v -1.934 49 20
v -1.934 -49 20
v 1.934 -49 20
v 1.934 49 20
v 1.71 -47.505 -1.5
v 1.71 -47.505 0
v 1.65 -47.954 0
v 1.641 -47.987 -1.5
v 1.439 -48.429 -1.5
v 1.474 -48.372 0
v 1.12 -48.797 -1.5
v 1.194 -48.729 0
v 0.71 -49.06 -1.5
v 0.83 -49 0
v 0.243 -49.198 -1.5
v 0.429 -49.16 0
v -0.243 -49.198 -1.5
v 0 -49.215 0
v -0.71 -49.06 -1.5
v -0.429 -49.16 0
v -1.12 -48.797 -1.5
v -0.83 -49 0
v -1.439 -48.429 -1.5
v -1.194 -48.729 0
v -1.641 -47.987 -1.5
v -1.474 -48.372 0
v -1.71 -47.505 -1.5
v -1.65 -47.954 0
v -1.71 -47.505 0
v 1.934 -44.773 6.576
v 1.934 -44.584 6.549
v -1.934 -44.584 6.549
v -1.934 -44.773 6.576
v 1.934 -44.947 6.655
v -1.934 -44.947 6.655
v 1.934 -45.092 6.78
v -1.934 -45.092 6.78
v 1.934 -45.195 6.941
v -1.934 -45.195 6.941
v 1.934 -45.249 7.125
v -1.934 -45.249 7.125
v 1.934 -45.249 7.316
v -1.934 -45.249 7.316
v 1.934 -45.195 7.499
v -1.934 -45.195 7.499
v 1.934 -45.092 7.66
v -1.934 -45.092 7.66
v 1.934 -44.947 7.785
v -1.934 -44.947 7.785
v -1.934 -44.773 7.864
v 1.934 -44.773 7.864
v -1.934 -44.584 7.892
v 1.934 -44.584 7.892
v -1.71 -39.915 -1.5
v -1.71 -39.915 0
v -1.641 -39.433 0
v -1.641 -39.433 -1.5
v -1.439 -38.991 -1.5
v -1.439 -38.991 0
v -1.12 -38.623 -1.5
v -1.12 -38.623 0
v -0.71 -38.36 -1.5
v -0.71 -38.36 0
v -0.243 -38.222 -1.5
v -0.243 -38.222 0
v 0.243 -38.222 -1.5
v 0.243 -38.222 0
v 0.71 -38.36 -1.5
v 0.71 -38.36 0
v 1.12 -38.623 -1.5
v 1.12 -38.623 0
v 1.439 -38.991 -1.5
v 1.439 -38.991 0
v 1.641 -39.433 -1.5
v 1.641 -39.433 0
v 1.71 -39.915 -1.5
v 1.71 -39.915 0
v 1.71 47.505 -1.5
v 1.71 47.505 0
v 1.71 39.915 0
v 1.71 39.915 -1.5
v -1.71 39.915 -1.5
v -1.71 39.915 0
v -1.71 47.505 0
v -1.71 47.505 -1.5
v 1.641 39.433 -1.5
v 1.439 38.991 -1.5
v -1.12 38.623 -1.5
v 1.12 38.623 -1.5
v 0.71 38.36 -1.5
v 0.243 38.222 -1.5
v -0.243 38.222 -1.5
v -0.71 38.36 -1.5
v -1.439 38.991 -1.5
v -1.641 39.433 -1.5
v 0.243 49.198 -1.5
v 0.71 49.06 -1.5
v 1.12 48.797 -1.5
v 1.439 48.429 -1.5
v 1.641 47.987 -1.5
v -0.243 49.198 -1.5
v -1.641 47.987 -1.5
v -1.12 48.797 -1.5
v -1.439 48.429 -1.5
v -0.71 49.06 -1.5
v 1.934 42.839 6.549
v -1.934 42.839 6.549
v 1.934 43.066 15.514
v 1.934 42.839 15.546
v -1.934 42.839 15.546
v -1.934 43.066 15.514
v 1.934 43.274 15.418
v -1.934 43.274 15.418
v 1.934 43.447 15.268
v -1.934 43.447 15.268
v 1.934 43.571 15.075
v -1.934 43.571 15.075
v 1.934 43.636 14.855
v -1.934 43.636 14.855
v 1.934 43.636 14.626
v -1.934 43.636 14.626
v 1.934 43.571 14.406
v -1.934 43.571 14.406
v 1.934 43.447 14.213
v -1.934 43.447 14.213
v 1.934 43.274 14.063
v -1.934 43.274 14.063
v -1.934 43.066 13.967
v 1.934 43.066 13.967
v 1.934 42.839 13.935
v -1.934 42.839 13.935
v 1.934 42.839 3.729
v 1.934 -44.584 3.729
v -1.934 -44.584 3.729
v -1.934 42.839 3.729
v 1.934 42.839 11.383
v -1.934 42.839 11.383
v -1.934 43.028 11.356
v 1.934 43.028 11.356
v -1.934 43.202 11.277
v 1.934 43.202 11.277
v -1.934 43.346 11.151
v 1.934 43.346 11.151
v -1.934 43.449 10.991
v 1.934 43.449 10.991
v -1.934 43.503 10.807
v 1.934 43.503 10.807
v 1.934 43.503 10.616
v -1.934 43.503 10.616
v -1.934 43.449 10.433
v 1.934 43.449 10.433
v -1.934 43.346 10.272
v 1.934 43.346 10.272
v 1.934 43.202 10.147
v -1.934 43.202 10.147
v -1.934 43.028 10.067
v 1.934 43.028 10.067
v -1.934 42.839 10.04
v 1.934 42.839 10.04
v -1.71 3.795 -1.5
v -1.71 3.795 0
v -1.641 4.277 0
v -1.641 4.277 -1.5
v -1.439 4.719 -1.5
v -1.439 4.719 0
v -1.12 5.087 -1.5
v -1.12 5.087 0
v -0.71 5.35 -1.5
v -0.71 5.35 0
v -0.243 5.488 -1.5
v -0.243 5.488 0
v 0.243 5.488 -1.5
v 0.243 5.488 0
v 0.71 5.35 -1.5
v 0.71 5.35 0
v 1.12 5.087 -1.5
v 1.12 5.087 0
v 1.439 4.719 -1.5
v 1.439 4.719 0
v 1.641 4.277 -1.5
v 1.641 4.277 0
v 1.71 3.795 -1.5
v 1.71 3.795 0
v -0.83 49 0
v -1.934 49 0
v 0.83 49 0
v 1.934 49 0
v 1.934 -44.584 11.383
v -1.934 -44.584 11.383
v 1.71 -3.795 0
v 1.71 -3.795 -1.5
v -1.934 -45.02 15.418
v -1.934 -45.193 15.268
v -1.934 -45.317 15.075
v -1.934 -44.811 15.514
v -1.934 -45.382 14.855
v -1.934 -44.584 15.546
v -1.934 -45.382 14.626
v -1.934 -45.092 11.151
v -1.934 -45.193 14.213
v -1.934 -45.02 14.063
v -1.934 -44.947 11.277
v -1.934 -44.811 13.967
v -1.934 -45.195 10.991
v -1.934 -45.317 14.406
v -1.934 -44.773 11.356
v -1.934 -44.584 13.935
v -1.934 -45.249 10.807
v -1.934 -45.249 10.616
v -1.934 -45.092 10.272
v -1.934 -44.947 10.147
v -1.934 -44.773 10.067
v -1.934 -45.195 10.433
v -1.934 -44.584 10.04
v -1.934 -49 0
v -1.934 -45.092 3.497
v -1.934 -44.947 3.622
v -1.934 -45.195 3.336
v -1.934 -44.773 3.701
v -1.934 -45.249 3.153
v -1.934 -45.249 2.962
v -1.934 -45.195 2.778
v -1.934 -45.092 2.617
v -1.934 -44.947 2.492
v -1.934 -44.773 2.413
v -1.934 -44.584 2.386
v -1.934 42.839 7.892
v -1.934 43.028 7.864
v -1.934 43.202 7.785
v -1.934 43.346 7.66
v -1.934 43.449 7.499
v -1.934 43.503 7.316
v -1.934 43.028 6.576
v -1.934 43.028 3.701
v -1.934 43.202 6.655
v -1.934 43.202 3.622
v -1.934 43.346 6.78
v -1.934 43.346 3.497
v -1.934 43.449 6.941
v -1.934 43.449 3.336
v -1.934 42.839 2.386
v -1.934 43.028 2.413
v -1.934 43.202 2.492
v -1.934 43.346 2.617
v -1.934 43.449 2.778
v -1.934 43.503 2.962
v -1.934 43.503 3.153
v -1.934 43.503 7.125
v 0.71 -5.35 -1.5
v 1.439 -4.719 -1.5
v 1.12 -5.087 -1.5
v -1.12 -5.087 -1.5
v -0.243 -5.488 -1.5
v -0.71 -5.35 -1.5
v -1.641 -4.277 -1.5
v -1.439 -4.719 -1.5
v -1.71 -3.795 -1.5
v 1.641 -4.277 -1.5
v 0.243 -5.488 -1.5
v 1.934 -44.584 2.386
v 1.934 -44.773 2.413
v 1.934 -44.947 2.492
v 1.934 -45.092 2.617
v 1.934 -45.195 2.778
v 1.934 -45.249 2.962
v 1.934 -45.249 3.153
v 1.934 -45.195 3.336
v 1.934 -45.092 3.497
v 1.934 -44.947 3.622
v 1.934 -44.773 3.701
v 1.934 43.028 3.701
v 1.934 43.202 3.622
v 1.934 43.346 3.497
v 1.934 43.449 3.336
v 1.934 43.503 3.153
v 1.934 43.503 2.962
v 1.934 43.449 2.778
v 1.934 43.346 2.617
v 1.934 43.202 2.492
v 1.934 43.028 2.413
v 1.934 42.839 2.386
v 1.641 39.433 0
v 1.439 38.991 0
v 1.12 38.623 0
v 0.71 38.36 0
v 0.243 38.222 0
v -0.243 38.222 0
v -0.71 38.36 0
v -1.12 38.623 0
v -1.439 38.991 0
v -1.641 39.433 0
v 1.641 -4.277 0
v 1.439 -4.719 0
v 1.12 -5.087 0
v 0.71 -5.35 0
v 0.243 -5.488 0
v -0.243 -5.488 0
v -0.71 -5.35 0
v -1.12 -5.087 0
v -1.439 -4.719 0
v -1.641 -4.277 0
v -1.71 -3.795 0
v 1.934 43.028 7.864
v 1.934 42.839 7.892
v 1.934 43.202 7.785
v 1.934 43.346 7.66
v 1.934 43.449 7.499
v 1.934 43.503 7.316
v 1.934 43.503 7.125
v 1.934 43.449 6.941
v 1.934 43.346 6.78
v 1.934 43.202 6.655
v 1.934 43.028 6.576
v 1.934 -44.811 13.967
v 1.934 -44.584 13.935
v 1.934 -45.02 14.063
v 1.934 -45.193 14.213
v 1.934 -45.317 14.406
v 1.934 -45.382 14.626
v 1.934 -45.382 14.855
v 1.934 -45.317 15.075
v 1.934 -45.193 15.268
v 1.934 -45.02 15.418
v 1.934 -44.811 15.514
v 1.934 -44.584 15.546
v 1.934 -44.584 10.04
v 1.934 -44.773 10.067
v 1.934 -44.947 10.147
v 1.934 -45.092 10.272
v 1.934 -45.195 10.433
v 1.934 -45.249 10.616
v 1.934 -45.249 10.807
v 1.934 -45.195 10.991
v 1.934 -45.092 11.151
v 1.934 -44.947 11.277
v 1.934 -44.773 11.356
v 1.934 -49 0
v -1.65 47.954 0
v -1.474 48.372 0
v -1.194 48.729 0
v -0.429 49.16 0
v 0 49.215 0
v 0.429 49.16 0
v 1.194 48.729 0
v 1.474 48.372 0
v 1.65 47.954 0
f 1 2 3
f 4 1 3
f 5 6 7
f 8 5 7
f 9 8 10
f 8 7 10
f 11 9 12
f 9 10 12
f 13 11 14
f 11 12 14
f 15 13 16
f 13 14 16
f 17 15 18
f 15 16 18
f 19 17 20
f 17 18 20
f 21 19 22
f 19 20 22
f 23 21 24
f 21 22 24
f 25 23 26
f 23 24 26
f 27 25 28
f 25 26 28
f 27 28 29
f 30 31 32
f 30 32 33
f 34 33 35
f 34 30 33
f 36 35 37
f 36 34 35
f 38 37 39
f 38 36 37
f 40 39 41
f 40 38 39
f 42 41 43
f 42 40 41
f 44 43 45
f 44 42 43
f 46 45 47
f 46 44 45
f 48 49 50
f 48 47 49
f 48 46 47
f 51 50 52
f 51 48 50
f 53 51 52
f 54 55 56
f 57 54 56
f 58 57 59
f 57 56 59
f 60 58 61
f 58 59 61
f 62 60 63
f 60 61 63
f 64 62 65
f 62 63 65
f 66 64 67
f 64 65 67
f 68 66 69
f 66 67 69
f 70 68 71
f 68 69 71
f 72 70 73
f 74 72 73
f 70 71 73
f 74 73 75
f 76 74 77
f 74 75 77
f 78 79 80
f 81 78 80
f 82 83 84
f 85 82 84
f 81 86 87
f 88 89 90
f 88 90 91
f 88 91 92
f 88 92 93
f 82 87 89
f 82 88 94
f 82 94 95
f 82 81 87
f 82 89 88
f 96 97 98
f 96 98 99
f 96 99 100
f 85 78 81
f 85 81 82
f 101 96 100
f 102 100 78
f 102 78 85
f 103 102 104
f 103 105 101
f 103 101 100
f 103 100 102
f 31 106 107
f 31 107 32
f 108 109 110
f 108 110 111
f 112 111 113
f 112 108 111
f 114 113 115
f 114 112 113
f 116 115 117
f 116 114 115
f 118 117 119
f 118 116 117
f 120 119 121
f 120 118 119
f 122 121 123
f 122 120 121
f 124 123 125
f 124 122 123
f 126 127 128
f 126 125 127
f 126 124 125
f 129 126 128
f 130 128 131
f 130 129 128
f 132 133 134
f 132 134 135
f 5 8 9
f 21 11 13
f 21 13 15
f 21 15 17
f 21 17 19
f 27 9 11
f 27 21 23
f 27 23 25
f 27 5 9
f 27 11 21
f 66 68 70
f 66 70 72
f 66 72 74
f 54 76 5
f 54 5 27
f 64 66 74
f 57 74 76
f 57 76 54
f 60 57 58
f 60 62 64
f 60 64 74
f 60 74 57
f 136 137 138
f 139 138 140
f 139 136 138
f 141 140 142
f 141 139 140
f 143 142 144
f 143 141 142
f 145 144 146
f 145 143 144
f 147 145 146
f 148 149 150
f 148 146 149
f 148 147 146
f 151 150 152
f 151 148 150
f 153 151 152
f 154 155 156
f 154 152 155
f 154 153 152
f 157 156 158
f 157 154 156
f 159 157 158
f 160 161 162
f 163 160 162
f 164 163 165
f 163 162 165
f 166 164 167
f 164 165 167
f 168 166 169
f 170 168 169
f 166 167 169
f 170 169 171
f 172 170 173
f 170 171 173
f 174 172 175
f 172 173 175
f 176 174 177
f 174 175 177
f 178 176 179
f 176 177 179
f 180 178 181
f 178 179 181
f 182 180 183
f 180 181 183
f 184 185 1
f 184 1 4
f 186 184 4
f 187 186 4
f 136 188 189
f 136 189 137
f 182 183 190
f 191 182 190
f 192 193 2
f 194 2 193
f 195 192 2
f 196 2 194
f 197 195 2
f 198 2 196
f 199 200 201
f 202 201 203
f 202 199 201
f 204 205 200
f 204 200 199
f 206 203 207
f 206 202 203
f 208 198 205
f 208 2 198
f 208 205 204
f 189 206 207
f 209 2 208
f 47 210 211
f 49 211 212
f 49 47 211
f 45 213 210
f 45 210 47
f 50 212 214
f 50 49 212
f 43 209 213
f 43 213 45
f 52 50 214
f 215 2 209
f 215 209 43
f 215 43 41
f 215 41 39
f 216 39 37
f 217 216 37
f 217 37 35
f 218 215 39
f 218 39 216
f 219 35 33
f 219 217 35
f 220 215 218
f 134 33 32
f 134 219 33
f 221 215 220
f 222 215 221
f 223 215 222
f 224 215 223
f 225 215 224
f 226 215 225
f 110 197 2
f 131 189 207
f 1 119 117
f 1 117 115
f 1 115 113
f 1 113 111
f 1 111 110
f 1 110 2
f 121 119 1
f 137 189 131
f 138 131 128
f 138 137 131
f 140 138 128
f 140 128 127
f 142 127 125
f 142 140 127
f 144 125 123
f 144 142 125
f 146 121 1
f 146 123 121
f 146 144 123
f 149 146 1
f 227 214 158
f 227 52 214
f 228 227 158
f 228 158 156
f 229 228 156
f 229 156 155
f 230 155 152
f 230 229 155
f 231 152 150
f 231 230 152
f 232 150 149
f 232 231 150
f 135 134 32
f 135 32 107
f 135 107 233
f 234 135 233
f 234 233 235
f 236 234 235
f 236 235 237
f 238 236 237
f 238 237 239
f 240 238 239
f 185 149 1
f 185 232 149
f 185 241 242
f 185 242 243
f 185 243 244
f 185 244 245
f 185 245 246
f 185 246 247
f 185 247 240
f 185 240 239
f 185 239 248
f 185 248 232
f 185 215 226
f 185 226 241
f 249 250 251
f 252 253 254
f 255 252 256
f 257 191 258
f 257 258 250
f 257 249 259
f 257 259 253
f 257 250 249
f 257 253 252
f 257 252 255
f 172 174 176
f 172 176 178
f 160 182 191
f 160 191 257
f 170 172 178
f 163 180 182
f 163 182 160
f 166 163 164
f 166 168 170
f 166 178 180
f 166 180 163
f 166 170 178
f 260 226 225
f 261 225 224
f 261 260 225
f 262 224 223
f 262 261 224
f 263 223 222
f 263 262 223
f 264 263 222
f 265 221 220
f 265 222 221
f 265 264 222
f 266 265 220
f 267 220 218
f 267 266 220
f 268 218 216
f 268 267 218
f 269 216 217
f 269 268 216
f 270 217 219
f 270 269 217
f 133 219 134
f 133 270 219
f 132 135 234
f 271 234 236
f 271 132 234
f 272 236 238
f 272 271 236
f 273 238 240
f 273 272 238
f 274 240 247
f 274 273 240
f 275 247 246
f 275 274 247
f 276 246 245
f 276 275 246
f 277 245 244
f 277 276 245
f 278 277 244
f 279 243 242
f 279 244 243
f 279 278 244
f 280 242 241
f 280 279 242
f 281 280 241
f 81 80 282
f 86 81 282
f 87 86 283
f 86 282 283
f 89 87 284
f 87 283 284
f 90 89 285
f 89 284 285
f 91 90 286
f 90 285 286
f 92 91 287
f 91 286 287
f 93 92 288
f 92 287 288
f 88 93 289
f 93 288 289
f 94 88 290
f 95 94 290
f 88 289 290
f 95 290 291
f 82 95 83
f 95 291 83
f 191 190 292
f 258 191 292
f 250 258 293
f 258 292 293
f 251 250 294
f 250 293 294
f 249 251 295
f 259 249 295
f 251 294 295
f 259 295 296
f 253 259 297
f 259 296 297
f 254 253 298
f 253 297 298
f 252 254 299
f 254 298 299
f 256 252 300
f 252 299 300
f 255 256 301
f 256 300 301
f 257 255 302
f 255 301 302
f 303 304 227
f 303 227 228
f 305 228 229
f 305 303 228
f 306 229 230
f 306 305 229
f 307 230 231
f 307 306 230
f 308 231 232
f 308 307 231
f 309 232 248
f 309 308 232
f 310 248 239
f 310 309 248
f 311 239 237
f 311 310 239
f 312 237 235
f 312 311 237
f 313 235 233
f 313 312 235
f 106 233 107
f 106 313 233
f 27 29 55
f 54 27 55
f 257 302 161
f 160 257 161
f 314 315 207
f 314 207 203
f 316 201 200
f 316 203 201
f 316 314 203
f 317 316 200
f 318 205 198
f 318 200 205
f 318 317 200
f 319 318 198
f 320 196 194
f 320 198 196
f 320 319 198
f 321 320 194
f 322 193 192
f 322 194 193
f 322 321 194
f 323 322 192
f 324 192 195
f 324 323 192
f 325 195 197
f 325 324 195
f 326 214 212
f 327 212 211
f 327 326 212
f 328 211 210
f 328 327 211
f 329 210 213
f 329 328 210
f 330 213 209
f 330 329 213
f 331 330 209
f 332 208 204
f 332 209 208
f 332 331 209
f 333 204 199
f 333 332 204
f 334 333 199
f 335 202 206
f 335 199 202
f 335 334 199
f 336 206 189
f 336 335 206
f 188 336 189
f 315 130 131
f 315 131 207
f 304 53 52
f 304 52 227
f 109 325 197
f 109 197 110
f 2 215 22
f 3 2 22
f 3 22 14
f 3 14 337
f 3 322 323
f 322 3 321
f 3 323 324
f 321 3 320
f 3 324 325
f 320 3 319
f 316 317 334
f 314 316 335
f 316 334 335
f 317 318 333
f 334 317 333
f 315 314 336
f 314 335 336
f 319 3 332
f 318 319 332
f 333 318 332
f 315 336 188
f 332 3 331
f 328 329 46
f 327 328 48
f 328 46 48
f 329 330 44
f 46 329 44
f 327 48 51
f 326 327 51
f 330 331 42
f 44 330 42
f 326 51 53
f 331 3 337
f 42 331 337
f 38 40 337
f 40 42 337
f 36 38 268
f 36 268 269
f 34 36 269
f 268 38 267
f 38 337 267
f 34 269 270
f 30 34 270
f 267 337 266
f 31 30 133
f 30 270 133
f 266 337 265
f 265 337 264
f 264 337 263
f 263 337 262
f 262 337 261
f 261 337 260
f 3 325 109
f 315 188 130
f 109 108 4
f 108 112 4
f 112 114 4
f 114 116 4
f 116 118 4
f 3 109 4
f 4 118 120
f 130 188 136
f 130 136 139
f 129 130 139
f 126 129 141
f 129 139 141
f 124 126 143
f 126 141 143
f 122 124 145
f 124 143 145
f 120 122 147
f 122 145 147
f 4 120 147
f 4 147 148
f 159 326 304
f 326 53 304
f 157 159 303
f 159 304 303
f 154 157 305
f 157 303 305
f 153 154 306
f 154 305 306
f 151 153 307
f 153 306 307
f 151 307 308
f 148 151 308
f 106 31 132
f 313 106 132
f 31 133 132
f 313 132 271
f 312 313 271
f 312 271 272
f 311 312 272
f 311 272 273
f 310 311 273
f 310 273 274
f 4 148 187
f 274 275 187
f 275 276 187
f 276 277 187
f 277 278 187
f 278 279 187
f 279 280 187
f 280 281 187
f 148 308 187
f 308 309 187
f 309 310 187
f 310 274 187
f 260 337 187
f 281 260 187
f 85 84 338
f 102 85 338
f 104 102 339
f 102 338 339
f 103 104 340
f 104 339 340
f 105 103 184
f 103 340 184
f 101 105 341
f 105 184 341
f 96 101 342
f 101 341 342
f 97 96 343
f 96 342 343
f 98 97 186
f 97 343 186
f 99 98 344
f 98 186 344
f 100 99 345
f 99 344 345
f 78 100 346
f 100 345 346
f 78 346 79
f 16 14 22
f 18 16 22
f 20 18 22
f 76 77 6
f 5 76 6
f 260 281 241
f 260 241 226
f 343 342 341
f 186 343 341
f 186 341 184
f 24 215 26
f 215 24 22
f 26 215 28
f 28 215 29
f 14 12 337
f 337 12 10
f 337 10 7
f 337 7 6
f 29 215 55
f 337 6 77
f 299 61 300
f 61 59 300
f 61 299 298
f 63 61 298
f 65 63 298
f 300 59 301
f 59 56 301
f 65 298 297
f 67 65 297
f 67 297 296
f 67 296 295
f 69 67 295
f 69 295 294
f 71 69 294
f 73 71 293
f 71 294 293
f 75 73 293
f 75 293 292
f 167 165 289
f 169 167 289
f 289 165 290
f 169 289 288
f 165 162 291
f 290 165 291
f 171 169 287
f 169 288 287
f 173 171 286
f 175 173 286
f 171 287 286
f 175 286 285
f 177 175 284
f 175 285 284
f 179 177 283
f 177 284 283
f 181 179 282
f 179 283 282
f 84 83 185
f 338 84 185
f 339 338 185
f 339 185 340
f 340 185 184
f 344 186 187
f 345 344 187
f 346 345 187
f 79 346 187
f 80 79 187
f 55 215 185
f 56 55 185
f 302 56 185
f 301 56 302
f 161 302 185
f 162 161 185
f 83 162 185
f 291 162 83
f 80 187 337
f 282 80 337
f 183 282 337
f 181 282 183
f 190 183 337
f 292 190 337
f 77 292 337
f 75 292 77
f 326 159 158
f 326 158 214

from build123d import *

# Parameters (mm, degrees)
SKETCH1_W           = 3.867553816
SKETCH1_H           = 98
BOSS_EXTRUDE3_DEPTH = 20
BOSS_EXTRUDE4_DEPTH = 1.5
CUT_EXTRUDE1_DEPTH  = 54.264192452


with BuildPart() as part:
    # Sketch1 → Boss-Extrude3 (new body)
    with BuildSketch(Plane.XY):
        Rectangle(SKETCH1_W, SKETCH1_H)
    extrude(amount=BOSS_EXTRUDE3_DEPTH)

    # Sketch1<6> → Boss-Extrude4 (add)
    with BuildSketch(Plane.XY):
        with BuildLine():
            Line((1.71, 3.795), (1.71, -3.795))
            ThreePointArc((1.71, -3.795), (0, -5.505), (-1.71, -3.795))
            Line((-1.71, -3.795), (-1.71, 3.795))
            ThreePointArc((-1.71, 3.795), (0, 5.505), (1.71, 3.795))
        make_face()
        with BuildLine():
            Line((1.71, -39.915), (1.71, -47.505))
            ThreePointArc((1.71, -47.505), (0, -49.215), (-1.71, -47.505))
            Line((-1.71, -47.505), (-1.71, -39.915))
            ThreePointArc((-1.71, -39.915), (0, -38.205), (1.71, -39.915))
        make_face()
        with BuildLine():
            Line((1.71, 47.505), (1.71, 39.915))
            ThreePointArc((1.71, 39.915), (0, 38.205), (-1.71, 39.915))
            Line((-1.71, 39.915), (-1.71, 47.505))
            ThreePointArc((-1.71, 47.505), (0, 49.215), (1.71, 47.505))
        make_face()
    extrude(amount=-BOSS_EXTRUDE4_DEPTH)

    # Sketch5 → Cut-Extrude1 (cut, through all)
    with BuildSketch(Plane(origin=(1.933776908, 0, 0), x_dir=(0, 0, -1), z_dir=(1, 0, 0))):
        with BuildLine():
            Line((-13.934698867, 42.838530115), (-13.934698867, -44.584300935))
            ThreePointArc((-13.934698867, -44.584300935), (-14.740439245, -45.390041313), (-15.546179624, -44.584300935))
            Line((-15.546179624, -44.584300935), (-15.546179624, 42.838530115))
            ThreePointArc((-15.546179624, 42.838530115), (-14.740439245, 43.644270494), (-13.934698867, 42.838530115))
        make_face()
        with BuildLine():
            Line((-10.040287038, 42.838530115), (-10.040287038, -44.584300935))
            ThreePointArc((-10.040287038, -44.584300935), (-10.711737354, -45.25575125), (-11.383187669, -44.584300935))
            Line((-11.383187669, -44.584300935), (-11.383187669, 42.838530115))
            ThreePointArc((-11.383187669, 42.838530115), (-10.711737354, 43.509980431), (-10.040287038, 42.838530115))
        make_face()
        with BuildLine():
            Line((-6.548745399, 42.838530115), (-6.548745399, -44.584300935))
            ThreePointArc((-6.548745399, -44.584300935), (-7.220195714, -45.25575125), (-7.891646029, -44.584300935))
            Line((-7.891646029, -44.584300935), (-7.891646029, 42.838530115))
            ThreePointArc((-7.891646029, 42.838530115), (-7.220195714, 43.509980431), (-6.548745399, 42.838530115))
        make_face()
        with BuildLine():
            Line((-2.385753444, 42.838530115), (-2.385753444, -44.584300935))
            ThreePointArc((-2.385753444, -44.584300935), (-3.057203759, -45.25575125), (-3.728654075, -44.584300935))
            Line((-3.728654075, -44.584300935), (-3.728654075, 42.838530115))
            ThreePointArc((-3.728654075, 42.838530115), (-3.057203759, 43.509980431), (-2.385753444, 42.838530115))
        make_face()
    extrude(amount=-CUT_EXTRUDE1_DEPTH, mode=Mode.SUBTRACT)


solid = part.part
